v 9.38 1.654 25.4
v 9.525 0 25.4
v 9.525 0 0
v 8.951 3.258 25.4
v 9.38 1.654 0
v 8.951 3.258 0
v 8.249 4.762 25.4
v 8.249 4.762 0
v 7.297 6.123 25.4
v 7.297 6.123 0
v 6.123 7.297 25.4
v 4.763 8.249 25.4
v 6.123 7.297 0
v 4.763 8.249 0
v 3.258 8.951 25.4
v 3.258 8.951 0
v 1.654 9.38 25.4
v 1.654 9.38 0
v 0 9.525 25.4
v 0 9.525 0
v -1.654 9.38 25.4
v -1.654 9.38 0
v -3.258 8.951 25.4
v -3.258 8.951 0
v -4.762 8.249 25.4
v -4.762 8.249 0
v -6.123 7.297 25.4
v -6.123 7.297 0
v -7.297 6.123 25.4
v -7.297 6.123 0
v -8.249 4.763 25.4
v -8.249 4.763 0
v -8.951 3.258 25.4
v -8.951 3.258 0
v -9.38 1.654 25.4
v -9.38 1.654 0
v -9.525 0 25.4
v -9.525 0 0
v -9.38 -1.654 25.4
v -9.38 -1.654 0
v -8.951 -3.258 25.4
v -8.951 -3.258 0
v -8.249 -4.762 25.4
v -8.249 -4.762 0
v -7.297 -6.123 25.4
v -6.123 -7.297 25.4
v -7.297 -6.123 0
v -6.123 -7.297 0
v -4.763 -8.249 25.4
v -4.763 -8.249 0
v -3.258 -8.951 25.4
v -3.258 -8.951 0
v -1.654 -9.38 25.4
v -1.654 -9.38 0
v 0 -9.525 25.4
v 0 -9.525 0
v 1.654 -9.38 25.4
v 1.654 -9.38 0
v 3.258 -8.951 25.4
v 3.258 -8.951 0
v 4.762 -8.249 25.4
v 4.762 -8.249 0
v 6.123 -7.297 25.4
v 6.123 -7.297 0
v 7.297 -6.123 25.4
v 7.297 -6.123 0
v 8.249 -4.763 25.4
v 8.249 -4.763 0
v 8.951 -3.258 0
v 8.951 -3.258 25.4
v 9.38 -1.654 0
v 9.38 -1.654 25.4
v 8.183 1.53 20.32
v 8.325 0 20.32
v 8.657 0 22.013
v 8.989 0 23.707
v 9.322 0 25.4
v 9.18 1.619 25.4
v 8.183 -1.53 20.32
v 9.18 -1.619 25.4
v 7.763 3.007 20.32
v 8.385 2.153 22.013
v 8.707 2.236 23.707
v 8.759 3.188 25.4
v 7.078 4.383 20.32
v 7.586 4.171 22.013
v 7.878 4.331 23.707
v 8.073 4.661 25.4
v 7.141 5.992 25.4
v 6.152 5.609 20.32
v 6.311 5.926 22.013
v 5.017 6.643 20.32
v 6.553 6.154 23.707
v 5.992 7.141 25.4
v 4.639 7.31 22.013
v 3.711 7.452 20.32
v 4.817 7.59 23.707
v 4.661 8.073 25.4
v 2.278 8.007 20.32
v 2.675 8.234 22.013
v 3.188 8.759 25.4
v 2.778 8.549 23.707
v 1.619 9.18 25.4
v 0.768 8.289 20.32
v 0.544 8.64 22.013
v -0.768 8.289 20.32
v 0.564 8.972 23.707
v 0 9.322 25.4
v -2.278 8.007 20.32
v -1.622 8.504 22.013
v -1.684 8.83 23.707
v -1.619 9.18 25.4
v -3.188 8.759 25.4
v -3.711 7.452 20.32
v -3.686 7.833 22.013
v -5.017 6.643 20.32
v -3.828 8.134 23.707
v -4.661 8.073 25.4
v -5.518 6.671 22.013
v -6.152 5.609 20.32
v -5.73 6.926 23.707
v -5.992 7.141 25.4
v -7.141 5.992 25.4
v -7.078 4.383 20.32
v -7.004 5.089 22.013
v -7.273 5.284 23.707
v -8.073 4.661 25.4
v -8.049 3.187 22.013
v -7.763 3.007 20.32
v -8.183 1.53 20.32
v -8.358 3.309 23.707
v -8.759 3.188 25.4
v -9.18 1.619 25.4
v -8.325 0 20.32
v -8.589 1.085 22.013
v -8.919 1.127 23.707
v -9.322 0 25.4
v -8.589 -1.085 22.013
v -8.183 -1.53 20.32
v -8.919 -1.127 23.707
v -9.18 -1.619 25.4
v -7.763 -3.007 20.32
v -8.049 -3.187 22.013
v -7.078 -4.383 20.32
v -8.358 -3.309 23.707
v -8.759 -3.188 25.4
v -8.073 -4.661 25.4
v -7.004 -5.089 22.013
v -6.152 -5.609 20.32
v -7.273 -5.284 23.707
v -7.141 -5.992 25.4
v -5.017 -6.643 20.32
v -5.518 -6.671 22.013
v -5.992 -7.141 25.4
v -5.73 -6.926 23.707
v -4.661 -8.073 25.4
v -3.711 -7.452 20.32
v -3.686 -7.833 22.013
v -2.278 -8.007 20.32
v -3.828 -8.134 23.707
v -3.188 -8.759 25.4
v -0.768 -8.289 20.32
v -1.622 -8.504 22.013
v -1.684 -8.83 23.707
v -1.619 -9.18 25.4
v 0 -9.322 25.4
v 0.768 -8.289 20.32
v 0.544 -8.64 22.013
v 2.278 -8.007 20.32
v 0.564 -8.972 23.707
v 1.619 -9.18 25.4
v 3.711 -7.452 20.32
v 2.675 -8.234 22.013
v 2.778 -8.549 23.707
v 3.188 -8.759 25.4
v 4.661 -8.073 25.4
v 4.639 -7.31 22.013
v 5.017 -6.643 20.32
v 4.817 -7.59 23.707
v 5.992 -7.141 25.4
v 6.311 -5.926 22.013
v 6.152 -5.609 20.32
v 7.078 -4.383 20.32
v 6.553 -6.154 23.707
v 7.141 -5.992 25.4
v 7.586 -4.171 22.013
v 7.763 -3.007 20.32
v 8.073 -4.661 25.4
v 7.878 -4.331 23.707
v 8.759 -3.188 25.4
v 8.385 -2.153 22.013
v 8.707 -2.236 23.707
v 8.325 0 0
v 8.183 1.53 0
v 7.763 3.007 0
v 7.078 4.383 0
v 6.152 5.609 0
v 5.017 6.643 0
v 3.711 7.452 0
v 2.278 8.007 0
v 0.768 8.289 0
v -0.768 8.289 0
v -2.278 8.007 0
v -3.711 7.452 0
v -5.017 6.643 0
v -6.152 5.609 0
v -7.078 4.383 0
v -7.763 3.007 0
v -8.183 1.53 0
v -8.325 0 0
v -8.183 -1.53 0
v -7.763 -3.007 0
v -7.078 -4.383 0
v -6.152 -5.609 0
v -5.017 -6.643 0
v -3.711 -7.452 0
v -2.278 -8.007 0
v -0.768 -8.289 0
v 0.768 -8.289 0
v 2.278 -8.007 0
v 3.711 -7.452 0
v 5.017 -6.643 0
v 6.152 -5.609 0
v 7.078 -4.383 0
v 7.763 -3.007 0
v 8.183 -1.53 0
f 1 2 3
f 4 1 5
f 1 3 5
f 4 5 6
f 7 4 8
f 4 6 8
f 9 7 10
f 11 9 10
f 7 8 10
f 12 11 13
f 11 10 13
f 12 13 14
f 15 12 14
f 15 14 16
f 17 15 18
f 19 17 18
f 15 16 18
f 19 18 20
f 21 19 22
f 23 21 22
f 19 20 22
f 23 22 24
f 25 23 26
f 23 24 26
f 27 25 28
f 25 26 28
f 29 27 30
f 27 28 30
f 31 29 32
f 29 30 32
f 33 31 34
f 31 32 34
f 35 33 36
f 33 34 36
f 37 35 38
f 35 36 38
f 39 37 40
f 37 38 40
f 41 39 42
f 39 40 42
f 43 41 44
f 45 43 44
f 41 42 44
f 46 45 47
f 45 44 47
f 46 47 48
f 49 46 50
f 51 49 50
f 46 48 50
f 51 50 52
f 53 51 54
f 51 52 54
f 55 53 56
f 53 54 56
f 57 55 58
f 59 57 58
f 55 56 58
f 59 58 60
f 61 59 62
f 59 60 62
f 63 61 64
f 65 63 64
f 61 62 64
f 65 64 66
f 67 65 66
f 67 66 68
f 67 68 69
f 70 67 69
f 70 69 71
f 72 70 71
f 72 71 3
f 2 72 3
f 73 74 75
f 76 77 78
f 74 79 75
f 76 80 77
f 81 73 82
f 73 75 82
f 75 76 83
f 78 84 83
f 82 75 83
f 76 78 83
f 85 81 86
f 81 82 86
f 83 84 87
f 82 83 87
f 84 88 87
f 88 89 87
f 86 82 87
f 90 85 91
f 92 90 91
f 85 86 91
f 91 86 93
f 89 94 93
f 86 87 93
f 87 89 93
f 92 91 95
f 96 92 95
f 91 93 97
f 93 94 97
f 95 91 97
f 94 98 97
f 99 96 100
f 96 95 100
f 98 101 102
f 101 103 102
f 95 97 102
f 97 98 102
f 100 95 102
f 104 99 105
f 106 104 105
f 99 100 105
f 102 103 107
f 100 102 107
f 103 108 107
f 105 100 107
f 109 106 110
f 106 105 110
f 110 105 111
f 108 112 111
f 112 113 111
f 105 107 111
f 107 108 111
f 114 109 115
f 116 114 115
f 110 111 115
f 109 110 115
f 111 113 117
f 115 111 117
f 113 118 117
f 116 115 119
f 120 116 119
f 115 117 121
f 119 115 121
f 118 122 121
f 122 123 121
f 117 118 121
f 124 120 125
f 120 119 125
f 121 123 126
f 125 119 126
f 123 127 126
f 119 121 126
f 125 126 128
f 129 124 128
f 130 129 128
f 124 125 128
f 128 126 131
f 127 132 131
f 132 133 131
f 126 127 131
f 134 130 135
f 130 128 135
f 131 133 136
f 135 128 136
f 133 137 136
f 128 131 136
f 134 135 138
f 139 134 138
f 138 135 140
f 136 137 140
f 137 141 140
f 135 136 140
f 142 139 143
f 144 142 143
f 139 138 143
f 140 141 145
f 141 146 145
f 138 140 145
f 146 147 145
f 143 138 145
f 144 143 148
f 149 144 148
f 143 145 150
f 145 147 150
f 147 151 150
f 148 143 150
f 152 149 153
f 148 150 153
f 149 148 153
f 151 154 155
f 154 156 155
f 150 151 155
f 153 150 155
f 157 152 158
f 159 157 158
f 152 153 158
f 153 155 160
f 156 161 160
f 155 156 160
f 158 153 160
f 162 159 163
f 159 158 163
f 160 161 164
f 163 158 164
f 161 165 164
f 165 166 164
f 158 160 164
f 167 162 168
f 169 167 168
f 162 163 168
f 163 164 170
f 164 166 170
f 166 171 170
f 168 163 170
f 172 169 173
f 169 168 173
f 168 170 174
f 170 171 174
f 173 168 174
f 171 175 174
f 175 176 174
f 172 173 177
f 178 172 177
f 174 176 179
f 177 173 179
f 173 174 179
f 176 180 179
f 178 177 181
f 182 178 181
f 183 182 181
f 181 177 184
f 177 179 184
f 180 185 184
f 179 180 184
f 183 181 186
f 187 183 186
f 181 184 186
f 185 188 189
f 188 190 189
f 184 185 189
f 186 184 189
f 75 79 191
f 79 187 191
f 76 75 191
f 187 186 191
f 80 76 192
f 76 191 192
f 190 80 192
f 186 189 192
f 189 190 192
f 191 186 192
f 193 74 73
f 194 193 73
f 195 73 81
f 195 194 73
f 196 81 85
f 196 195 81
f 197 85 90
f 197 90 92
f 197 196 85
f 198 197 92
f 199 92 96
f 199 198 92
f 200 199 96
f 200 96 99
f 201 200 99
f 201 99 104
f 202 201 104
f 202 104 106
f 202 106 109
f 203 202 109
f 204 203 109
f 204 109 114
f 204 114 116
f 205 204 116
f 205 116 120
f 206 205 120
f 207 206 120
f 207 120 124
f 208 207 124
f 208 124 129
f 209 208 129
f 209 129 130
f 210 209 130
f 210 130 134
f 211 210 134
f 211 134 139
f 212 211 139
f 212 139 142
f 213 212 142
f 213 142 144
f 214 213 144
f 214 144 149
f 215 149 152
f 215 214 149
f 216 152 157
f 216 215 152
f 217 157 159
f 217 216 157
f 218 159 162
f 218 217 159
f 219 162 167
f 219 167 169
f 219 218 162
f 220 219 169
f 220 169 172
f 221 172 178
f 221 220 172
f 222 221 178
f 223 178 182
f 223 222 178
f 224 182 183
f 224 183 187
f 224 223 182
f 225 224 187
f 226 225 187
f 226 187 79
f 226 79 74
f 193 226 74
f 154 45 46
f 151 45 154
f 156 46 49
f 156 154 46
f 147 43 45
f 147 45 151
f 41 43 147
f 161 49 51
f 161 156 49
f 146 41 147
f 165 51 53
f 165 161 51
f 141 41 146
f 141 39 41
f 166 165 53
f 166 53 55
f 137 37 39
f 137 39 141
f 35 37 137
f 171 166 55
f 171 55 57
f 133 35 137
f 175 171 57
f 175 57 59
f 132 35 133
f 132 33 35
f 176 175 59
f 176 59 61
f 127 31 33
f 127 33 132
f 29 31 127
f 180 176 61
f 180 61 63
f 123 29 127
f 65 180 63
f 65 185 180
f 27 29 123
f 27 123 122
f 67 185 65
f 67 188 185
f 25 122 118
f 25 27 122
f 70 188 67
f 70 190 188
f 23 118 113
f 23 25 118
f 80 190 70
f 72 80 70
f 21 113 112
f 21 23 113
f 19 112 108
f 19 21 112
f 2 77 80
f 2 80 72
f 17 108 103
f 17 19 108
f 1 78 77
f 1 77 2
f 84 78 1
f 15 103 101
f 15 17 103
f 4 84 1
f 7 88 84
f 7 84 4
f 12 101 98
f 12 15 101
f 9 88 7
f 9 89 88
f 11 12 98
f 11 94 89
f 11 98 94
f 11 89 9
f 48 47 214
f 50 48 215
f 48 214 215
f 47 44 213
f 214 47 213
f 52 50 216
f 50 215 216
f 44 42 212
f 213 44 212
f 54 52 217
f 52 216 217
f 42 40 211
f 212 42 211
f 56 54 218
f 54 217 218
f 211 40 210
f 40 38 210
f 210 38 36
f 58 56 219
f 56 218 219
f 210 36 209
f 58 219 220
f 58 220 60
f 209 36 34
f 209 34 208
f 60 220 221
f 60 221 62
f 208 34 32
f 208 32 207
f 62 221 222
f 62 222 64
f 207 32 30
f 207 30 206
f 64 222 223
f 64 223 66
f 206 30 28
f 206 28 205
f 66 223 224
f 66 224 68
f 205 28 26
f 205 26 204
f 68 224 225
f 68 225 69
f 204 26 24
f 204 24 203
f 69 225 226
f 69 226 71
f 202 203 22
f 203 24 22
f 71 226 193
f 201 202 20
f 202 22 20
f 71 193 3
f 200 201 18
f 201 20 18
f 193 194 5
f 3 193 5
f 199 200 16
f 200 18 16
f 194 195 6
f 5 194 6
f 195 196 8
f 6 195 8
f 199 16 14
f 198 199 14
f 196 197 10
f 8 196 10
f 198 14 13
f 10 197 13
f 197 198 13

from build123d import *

# Parameters (mm, degrees)
F0_R     = 9.525
F1_DEPTH = 25.4
F2_T     = -1.2
F3_SIZE2 = 0.9966563757
F3_SIZE  = 5.08


with BuildPart() as f1:
    # F0 (on Top) → F1 (new body)
    with BuildSketch(Plane.XY):
        Circle(F0_R)
    extrude(amount=F1_DEPTH)

    # F2
    f2_openings = [f1.faces().sort_by_distance(p)[0] for p in [
        (0, 0, 25.4),
        (0, 0, 0),
    ]]
    offset(amount=F2_T, openings=f2_openings)

    # F3
    f3_edges = [f1.edges().sort_by_distance(p)[0] for p in [
        (-8.325, 0, 25.4),
    ]]
    chamfer(f3_edges, length=F3_SIZE, length2=F3_SIZE2)


solid = f1.part
